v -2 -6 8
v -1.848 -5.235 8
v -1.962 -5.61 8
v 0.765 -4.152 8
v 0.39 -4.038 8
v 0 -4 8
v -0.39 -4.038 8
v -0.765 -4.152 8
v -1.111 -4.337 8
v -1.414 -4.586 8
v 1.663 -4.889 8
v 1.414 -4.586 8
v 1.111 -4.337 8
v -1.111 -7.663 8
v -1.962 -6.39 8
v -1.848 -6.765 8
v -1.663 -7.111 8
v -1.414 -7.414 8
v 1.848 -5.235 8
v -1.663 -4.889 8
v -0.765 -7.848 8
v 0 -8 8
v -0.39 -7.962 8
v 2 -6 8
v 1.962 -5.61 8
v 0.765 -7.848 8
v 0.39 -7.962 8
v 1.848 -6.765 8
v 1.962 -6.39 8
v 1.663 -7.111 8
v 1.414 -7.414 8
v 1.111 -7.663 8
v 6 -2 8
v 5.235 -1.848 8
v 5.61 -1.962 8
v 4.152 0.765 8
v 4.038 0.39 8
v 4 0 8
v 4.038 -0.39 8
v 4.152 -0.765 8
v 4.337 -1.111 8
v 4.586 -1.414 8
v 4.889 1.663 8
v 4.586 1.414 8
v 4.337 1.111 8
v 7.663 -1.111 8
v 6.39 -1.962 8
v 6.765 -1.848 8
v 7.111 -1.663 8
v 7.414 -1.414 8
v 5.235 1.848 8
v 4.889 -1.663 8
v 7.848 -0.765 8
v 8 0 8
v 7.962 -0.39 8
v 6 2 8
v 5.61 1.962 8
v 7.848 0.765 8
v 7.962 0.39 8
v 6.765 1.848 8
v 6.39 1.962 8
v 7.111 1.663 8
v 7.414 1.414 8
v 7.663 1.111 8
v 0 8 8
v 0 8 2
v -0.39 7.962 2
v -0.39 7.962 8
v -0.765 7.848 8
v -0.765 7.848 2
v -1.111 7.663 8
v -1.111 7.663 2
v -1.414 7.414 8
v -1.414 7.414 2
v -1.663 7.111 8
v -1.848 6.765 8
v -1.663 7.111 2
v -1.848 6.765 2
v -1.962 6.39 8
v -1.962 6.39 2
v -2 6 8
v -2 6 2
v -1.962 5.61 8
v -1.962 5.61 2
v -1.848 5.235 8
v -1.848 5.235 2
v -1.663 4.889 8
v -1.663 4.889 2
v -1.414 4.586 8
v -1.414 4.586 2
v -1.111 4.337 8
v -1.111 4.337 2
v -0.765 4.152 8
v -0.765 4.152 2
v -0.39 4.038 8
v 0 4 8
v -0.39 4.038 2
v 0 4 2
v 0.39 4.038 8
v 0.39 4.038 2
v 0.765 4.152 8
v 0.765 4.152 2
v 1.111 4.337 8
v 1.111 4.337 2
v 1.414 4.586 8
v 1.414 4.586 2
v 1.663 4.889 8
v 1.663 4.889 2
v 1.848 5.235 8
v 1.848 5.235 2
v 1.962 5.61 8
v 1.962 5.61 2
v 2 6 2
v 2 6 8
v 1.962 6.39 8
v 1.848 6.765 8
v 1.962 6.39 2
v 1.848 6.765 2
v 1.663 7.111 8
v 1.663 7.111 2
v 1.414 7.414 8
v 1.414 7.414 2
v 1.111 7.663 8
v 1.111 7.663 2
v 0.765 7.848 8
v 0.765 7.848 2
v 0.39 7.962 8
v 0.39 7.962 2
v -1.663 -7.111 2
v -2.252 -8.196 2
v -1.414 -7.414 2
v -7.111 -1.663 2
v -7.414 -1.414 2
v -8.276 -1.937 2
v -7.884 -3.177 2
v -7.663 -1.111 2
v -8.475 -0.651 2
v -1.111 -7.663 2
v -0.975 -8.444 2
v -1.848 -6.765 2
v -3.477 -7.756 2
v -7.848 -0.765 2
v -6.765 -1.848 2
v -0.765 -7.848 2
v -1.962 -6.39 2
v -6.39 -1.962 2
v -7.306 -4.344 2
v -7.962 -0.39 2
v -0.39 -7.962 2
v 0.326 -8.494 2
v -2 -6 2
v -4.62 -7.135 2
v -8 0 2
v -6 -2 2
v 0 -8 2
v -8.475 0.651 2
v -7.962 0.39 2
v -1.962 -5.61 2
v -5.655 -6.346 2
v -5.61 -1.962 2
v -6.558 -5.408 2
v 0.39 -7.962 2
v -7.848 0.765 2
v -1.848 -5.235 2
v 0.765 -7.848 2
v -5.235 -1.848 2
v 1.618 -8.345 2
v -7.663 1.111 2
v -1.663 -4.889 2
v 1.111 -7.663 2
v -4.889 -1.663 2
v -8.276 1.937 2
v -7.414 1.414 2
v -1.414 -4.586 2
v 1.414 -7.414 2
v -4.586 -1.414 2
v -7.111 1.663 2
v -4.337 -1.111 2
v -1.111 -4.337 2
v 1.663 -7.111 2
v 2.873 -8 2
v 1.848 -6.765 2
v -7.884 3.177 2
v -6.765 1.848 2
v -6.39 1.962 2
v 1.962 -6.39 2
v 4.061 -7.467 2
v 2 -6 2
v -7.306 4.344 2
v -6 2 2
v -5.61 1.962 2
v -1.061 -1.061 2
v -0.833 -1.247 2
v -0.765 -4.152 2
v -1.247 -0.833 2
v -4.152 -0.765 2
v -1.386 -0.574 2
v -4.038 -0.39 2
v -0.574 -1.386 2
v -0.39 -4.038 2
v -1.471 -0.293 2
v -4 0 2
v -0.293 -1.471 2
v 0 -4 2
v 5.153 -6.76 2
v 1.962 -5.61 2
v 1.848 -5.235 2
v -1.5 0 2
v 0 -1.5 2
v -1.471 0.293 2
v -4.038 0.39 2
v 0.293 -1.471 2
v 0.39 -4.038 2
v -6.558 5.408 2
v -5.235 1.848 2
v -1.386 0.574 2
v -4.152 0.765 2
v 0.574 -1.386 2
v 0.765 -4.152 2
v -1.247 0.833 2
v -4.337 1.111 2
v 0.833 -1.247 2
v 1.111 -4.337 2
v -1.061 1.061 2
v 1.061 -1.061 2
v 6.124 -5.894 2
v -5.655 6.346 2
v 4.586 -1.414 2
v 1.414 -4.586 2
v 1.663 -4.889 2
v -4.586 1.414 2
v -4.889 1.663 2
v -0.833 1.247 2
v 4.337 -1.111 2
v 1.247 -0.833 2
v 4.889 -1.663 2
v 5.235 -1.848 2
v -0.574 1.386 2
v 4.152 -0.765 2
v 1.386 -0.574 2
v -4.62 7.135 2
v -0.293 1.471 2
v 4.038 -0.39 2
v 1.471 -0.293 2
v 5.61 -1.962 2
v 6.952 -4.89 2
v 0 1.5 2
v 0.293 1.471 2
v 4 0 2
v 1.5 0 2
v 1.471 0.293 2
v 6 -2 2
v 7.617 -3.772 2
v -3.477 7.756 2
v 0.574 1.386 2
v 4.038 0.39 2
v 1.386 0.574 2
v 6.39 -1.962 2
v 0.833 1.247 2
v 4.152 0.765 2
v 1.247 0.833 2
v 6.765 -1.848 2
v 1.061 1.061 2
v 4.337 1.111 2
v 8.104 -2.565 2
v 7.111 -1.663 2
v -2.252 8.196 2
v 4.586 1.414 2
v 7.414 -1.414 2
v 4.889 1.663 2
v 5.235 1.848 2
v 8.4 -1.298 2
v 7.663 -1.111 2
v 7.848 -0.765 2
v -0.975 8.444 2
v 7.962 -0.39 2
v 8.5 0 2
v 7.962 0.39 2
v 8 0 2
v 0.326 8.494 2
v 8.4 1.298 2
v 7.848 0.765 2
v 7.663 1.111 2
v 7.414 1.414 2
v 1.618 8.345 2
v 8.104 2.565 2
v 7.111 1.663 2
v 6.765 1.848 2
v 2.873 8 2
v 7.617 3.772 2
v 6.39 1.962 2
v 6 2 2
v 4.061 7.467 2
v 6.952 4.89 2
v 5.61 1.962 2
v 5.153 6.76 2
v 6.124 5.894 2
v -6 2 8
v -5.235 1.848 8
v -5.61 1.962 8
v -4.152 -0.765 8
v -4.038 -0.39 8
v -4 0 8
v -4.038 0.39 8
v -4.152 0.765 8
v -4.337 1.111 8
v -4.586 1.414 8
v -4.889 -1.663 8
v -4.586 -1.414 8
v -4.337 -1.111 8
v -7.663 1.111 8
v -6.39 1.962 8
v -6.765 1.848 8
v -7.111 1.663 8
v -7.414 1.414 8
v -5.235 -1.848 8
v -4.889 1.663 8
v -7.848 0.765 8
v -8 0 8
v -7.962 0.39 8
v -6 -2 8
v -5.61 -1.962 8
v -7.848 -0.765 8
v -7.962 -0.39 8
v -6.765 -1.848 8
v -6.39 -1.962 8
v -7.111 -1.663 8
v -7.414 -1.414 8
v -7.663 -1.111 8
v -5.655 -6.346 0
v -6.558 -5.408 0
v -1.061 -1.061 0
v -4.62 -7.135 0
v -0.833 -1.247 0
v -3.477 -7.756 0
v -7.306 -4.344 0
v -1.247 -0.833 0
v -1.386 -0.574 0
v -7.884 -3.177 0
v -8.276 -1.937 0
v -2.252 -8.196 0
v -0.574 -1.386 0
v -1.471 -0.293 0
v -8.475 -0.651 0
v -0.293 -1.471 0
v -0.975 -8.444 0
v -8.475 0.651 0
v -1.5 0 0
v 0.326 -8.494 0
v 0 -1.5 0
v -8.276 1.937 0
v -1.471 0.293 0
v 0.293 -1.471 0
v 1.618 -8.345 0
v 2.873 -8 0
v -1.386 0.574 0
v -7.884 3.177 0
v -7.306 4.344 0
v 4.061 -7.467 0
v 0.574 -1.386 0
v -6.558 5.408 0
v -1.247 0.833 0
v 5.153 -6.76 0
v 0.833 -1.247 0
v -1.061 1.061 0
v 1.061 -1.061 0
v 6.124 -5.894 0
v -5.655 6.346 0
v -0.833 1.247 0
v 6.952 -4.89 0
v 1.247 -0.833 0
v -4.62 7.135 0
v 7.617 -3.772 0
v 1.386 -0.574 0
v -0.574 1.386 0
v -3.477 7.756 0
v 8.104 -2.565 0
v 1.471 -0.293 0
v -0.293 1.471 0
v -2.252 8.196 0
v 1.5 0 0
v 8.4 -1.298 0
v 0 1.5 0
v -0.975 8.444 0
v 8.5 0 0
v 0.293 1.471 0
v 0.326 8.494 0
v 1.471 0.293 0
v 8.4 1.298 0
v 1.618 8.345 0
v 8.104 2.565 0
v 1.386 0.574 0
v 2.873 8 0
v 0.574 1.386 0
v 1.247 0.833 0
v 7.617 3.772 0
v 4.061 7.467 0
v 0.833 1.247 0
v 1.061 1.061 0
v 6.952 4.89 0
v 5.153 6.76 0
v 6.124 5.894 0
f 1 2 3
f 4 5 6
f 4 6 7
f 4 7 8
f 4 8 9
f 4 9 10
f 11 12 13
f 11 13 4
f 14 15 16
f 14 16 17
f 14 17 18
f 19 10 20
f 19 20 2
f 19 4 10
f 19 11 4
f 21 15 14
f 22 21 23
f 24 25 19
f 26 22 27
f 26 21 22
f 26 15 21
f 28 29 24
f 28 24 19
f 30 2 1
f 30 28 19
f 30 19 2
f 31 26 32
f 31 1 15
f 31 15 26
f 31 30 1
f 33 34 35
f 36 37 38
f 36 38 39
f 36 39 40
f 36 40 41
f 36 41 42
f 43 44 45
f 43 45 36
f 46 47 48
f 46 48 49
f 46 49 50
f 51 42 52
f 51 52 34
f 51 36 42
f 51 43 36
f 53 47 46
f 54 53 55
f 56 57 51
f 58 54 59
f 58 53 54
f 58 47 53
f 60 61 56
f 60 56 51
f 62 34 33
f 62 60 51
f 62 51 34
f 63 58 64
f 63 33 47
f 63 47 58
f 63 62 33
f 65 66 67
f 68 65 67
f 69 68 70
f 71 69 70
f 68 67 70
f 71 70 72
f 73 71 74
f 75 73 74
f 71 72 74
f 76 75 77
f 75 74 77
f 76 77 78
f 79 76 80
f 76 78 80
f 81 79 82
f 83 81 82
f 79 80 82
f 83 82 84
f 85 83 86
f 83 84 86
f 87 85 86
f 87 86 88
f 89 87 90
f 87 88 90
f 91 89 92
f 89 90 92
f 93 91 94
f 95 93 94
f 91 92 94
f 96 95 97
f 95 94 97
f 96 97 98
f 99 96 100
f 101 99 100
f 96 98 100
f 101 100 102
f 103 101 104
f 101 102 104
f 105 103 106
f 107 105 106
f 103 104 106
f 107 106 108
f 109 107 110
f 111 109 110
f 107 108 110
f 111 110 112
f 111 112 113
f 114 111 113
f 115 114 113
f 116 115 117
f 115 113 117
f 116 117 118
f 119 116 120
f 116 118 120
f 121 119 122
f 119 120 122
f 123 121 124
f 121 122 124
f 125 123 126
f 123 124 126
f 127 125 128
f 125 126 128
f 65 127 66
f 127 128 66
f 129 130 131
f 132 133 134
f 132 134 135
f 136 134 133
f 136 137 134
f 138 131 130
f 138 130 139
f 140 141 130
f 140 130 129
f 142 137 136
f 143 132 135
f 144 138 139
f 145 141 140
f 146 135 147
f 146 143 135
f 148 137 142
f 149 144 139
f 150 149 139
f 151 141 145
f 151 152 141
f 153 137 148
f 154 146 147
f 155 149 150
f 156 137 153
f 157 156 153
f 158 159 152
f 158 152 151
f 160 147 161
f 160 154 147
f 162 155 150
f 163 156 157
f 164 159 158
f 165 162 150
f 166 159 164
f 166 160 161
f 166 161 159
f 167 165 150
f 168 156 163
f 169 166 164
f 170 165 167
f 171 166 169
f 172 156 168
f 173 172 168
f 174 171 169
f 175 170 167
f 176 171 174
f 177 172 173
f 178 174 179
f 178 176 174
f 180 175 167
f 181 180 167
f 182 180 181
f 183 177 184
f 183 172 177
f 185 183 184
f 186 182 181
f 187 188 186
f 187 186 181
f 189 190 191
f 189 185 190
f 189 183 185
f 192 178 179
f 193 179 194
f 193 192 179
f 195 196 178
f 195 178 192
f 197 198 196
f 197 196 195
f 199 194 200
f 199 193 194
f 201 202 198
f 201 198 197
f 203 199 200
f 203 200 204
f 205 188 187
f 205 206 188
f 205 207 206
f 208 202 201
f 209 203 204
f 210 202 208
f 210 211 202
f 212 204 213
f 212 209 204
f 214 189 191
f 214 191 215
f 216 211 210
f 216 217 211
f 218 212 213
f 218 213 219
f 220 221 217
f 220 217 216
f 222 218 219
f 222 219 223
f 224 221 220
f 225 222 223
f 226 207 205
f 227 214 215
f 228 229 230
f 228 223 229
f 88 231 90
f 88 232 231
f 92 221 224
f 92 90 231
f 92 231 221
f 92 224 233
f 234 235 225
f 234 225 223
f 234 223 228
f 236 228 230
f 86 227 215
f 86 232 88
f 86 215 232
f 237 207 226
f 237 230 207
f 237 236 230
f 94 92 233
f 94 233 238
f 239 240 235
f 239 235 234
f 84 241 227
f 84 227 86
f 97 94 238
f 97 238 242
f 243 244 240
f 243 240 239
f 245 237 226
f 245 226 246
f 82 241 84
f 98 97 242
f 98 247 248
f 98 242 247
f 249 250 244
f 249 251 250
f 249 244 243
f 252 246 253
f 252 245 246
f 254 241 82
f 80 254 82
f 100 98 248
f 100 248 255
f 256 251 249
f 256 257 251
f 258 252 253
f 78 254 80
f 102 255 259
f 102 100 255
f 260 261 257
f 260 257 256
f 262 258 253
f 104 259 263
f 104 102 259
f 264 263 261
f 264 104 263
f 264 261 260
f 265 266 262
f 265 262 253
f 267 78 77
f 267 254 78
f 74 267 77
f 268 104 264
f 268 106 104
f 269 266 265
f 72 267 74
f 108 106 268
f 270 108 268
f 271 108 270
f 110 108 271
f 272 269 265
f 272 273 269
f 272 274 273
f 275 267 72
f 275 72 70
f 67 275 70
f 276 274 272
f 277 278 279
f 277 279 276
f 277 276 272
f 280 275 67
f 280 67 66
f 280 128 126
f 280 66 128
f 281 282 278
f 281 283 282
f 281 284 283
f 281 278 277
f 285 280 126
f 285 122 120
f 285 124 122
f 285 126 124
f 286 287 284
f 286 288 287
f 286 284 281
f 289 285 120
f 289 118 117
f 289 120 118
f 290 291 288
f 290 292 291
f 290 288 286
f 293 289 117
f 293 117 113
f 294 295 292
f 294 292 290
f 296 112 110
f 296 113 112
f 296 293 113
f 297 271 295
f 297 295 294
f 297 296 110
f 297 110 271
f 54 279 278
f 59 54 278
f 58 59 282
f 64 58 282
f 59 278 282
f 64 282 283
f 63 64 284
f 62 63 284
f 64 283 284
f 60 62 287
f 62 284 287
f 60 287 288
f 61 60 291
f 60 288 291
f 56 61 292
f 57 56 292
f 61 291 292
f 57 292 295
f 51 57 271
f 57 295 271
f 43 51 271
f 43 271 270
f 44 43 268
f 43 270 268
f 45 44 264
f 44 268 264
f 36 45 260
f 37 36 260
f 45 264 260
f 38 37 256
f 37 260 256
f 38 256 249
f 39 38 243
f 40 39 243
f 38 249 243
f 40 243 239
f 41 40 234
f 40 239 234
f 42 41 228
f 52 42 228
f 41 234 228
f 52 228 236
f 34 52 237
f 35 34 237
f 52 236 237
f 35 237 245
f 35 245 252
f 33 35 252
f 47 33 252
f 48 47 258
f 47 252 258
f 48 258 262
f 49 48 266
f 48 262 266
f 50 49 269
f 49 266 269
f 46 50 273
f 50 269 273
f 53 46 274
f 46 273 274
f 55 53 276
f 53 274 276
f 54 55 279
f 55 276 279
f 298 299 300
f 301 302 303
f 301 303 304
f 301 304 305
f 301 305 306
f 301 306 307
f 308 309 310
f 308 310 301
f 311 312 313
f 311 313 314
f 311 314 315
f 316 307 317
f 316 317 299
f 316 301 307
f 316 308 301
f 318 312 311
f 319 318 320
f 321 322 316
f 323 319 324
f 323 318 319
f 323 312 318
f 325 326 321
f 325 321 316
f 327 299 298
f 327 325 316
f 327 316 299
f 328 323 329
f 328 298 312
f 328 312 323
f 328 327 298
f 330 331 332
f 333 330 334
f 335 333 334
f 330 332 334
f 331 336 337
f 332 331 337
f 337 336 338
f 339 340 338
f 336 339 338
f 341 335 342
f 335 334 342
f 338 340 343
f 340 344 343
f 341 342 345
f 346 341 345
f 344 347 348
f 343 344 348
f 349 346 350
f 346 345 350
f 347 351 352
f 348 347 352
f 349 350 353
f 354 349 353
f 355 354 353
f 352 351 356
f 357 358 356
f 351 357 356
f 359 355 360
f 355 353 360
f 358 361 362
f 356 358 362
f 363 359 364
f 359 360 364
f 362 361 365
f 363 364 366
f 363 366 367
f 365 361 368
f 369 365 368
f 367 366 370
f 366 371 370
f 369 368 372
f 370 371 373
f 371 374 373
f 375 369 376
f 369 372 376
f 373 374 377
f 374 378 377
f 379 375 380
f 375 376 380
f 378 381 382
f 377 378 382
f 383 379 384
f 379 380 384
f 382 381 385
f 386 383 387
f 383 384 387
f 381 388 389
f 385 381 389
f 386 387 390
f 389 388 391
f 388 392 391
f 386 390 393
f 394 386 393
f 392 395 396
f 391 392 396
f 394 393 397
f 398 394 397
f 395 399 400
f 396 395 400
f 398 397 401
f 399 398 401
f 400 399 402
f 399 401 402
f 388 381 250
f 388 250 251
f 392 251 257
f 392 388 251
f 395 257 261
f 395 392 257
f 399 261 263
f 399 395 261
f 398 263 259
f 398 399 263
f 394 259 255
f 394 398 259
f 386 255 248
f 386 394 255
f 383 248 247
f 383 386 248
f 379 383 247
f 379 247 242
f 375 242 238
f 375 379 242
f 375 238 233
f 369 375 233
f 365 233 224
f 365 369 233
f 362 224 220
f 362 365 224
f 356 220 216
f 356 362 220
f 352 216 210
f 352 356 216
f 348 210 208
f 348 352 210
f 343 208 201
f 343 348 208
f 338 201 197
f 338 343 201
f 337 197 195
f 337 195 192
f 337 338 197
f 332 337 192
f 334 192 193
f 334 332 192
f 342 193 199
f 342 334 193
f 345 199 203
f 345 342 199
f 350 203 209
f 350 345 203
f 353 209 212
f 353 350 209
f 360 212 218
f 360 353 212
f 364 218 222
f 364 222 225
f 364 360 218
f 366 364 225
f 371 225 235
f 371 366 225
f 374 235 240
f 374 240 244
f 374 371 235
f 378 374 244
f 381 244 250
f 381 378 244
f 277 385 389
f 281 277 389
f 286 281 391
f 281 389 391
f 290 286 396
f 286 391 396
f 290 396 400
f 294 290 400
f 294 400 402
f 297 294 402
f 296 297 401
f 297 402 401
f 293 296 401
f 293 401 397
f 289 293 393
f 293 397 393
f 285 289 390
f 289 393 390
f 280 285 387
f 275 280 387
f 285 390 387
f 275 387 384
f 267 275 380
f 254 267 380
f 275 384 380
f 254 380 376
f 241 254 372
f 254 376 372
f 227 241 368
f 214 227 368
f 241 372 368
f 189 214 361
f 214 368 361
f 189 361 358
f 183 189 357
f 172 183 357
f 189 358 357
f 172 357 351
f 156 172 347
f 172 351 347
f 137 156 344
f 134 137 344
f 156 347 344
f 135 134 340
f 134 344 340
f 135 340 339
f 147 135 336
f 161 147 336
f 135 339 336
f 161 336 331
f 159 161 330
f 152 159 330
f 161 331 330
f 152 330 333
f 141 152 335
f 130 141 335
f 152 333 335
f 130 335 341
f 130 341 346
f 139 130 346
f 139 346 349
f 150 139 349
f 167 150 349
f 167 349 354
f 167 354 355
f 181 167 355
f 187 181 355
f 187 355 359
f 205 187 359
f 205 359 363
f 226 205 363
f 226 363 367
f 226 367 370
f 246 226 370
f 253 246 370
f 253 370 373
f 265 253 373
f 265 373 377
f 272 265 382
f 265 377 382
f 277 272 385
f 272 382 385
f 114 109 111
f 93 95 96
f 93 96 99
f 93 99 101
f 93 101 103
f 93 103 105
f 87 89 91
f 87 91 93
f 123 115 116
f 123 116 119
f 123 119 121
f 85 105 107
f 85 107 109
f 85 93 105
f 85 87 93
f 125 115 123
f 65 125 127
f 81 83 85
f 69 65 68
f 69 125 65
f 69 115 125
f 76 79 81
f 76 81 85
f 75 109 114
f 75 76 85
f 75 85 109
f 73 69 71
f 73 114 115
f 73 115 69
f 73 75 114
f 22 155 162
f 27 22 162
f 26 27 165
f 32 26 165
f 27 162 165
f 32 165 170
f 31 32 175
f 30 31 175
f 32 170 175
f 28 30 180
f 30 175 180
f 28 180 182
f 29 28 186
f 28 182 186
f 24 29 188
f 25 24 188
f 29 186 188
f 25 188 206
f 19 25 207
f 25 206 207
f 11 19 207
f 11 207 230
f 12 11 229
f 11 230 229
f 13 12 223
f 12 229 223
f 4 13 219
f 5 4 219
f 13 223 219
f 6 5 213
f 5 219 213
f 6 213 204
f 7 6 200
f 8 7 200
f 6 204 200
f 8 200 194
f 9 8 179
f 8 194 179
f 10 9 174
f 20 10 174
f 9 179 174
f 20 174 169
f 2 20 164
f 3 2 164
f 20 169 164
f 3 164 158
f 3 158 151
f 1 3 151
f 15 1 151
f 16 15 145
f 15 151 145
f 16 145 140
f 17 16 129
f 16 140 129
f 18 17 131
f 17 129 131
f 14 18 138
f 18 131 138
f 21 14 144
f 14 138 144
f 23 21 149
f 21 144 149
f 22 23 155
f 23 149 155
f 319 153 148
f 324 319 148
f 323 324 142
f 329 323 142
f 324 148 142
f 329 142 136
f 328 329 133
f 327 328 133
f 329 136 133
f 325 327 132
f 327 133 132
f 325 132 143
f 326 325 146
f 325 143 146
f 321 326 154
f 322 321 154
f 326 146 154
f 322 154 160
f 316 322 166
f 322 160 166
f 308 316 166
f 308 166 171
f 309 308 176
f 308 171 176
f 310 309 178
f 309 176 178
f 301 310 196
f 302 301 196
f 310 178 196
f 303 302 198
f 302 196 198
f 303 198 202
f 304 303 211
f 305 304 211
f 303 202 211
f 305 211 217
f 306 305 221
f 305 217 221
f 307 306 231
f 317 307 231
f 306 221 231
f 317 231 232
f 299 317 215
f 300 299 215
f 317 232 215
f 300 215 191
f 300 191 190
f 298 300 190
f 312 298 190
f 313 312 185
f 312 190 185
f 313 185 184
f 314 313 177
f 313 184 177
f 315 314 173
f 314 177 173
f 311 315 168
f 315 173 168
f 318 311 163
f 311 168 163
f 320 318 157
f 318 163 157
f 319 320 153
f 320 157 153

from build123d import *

# Parameters (mm, degrees)
SKETCH_R           = 8.5
SKETCH_R_2         = 1.5
PAD_DEPTH          = 2
SKETCH001_R        = 2
PAD001_DEPTH       = 6
POLARPATTERN_COUNT = 4


with BuildPart() as part:
    # Sketch → Pad (new body)
    with BuildSketch(Plane.XY):
        Circle(SKETCH_R)
        Circle(SKETCH_R_2, mode=Mode.SUBTRACT)
    extrude(amount=PAD_DEPTH)

    # Sketch001 → Pad001 (new body)
    with BuildSketch(Plane.XY.offset(2)):
        with Locations((6, 0)):
            Circle(SKETCH001_R)
    pad001 = extrude(amount=PAD001_DEPTH)

    # PolarPattern: Pad001 ×4 about axis
    polarpattern_axis = Axis((0, 0, 2), (0, 0, 1))
    for i in range(1, POLARPATTERN_COUNT):
        add(pad001.rotate(polarpattern_axis, i * 360 / POLARPATTERN_COUNT))


solid = part.part
